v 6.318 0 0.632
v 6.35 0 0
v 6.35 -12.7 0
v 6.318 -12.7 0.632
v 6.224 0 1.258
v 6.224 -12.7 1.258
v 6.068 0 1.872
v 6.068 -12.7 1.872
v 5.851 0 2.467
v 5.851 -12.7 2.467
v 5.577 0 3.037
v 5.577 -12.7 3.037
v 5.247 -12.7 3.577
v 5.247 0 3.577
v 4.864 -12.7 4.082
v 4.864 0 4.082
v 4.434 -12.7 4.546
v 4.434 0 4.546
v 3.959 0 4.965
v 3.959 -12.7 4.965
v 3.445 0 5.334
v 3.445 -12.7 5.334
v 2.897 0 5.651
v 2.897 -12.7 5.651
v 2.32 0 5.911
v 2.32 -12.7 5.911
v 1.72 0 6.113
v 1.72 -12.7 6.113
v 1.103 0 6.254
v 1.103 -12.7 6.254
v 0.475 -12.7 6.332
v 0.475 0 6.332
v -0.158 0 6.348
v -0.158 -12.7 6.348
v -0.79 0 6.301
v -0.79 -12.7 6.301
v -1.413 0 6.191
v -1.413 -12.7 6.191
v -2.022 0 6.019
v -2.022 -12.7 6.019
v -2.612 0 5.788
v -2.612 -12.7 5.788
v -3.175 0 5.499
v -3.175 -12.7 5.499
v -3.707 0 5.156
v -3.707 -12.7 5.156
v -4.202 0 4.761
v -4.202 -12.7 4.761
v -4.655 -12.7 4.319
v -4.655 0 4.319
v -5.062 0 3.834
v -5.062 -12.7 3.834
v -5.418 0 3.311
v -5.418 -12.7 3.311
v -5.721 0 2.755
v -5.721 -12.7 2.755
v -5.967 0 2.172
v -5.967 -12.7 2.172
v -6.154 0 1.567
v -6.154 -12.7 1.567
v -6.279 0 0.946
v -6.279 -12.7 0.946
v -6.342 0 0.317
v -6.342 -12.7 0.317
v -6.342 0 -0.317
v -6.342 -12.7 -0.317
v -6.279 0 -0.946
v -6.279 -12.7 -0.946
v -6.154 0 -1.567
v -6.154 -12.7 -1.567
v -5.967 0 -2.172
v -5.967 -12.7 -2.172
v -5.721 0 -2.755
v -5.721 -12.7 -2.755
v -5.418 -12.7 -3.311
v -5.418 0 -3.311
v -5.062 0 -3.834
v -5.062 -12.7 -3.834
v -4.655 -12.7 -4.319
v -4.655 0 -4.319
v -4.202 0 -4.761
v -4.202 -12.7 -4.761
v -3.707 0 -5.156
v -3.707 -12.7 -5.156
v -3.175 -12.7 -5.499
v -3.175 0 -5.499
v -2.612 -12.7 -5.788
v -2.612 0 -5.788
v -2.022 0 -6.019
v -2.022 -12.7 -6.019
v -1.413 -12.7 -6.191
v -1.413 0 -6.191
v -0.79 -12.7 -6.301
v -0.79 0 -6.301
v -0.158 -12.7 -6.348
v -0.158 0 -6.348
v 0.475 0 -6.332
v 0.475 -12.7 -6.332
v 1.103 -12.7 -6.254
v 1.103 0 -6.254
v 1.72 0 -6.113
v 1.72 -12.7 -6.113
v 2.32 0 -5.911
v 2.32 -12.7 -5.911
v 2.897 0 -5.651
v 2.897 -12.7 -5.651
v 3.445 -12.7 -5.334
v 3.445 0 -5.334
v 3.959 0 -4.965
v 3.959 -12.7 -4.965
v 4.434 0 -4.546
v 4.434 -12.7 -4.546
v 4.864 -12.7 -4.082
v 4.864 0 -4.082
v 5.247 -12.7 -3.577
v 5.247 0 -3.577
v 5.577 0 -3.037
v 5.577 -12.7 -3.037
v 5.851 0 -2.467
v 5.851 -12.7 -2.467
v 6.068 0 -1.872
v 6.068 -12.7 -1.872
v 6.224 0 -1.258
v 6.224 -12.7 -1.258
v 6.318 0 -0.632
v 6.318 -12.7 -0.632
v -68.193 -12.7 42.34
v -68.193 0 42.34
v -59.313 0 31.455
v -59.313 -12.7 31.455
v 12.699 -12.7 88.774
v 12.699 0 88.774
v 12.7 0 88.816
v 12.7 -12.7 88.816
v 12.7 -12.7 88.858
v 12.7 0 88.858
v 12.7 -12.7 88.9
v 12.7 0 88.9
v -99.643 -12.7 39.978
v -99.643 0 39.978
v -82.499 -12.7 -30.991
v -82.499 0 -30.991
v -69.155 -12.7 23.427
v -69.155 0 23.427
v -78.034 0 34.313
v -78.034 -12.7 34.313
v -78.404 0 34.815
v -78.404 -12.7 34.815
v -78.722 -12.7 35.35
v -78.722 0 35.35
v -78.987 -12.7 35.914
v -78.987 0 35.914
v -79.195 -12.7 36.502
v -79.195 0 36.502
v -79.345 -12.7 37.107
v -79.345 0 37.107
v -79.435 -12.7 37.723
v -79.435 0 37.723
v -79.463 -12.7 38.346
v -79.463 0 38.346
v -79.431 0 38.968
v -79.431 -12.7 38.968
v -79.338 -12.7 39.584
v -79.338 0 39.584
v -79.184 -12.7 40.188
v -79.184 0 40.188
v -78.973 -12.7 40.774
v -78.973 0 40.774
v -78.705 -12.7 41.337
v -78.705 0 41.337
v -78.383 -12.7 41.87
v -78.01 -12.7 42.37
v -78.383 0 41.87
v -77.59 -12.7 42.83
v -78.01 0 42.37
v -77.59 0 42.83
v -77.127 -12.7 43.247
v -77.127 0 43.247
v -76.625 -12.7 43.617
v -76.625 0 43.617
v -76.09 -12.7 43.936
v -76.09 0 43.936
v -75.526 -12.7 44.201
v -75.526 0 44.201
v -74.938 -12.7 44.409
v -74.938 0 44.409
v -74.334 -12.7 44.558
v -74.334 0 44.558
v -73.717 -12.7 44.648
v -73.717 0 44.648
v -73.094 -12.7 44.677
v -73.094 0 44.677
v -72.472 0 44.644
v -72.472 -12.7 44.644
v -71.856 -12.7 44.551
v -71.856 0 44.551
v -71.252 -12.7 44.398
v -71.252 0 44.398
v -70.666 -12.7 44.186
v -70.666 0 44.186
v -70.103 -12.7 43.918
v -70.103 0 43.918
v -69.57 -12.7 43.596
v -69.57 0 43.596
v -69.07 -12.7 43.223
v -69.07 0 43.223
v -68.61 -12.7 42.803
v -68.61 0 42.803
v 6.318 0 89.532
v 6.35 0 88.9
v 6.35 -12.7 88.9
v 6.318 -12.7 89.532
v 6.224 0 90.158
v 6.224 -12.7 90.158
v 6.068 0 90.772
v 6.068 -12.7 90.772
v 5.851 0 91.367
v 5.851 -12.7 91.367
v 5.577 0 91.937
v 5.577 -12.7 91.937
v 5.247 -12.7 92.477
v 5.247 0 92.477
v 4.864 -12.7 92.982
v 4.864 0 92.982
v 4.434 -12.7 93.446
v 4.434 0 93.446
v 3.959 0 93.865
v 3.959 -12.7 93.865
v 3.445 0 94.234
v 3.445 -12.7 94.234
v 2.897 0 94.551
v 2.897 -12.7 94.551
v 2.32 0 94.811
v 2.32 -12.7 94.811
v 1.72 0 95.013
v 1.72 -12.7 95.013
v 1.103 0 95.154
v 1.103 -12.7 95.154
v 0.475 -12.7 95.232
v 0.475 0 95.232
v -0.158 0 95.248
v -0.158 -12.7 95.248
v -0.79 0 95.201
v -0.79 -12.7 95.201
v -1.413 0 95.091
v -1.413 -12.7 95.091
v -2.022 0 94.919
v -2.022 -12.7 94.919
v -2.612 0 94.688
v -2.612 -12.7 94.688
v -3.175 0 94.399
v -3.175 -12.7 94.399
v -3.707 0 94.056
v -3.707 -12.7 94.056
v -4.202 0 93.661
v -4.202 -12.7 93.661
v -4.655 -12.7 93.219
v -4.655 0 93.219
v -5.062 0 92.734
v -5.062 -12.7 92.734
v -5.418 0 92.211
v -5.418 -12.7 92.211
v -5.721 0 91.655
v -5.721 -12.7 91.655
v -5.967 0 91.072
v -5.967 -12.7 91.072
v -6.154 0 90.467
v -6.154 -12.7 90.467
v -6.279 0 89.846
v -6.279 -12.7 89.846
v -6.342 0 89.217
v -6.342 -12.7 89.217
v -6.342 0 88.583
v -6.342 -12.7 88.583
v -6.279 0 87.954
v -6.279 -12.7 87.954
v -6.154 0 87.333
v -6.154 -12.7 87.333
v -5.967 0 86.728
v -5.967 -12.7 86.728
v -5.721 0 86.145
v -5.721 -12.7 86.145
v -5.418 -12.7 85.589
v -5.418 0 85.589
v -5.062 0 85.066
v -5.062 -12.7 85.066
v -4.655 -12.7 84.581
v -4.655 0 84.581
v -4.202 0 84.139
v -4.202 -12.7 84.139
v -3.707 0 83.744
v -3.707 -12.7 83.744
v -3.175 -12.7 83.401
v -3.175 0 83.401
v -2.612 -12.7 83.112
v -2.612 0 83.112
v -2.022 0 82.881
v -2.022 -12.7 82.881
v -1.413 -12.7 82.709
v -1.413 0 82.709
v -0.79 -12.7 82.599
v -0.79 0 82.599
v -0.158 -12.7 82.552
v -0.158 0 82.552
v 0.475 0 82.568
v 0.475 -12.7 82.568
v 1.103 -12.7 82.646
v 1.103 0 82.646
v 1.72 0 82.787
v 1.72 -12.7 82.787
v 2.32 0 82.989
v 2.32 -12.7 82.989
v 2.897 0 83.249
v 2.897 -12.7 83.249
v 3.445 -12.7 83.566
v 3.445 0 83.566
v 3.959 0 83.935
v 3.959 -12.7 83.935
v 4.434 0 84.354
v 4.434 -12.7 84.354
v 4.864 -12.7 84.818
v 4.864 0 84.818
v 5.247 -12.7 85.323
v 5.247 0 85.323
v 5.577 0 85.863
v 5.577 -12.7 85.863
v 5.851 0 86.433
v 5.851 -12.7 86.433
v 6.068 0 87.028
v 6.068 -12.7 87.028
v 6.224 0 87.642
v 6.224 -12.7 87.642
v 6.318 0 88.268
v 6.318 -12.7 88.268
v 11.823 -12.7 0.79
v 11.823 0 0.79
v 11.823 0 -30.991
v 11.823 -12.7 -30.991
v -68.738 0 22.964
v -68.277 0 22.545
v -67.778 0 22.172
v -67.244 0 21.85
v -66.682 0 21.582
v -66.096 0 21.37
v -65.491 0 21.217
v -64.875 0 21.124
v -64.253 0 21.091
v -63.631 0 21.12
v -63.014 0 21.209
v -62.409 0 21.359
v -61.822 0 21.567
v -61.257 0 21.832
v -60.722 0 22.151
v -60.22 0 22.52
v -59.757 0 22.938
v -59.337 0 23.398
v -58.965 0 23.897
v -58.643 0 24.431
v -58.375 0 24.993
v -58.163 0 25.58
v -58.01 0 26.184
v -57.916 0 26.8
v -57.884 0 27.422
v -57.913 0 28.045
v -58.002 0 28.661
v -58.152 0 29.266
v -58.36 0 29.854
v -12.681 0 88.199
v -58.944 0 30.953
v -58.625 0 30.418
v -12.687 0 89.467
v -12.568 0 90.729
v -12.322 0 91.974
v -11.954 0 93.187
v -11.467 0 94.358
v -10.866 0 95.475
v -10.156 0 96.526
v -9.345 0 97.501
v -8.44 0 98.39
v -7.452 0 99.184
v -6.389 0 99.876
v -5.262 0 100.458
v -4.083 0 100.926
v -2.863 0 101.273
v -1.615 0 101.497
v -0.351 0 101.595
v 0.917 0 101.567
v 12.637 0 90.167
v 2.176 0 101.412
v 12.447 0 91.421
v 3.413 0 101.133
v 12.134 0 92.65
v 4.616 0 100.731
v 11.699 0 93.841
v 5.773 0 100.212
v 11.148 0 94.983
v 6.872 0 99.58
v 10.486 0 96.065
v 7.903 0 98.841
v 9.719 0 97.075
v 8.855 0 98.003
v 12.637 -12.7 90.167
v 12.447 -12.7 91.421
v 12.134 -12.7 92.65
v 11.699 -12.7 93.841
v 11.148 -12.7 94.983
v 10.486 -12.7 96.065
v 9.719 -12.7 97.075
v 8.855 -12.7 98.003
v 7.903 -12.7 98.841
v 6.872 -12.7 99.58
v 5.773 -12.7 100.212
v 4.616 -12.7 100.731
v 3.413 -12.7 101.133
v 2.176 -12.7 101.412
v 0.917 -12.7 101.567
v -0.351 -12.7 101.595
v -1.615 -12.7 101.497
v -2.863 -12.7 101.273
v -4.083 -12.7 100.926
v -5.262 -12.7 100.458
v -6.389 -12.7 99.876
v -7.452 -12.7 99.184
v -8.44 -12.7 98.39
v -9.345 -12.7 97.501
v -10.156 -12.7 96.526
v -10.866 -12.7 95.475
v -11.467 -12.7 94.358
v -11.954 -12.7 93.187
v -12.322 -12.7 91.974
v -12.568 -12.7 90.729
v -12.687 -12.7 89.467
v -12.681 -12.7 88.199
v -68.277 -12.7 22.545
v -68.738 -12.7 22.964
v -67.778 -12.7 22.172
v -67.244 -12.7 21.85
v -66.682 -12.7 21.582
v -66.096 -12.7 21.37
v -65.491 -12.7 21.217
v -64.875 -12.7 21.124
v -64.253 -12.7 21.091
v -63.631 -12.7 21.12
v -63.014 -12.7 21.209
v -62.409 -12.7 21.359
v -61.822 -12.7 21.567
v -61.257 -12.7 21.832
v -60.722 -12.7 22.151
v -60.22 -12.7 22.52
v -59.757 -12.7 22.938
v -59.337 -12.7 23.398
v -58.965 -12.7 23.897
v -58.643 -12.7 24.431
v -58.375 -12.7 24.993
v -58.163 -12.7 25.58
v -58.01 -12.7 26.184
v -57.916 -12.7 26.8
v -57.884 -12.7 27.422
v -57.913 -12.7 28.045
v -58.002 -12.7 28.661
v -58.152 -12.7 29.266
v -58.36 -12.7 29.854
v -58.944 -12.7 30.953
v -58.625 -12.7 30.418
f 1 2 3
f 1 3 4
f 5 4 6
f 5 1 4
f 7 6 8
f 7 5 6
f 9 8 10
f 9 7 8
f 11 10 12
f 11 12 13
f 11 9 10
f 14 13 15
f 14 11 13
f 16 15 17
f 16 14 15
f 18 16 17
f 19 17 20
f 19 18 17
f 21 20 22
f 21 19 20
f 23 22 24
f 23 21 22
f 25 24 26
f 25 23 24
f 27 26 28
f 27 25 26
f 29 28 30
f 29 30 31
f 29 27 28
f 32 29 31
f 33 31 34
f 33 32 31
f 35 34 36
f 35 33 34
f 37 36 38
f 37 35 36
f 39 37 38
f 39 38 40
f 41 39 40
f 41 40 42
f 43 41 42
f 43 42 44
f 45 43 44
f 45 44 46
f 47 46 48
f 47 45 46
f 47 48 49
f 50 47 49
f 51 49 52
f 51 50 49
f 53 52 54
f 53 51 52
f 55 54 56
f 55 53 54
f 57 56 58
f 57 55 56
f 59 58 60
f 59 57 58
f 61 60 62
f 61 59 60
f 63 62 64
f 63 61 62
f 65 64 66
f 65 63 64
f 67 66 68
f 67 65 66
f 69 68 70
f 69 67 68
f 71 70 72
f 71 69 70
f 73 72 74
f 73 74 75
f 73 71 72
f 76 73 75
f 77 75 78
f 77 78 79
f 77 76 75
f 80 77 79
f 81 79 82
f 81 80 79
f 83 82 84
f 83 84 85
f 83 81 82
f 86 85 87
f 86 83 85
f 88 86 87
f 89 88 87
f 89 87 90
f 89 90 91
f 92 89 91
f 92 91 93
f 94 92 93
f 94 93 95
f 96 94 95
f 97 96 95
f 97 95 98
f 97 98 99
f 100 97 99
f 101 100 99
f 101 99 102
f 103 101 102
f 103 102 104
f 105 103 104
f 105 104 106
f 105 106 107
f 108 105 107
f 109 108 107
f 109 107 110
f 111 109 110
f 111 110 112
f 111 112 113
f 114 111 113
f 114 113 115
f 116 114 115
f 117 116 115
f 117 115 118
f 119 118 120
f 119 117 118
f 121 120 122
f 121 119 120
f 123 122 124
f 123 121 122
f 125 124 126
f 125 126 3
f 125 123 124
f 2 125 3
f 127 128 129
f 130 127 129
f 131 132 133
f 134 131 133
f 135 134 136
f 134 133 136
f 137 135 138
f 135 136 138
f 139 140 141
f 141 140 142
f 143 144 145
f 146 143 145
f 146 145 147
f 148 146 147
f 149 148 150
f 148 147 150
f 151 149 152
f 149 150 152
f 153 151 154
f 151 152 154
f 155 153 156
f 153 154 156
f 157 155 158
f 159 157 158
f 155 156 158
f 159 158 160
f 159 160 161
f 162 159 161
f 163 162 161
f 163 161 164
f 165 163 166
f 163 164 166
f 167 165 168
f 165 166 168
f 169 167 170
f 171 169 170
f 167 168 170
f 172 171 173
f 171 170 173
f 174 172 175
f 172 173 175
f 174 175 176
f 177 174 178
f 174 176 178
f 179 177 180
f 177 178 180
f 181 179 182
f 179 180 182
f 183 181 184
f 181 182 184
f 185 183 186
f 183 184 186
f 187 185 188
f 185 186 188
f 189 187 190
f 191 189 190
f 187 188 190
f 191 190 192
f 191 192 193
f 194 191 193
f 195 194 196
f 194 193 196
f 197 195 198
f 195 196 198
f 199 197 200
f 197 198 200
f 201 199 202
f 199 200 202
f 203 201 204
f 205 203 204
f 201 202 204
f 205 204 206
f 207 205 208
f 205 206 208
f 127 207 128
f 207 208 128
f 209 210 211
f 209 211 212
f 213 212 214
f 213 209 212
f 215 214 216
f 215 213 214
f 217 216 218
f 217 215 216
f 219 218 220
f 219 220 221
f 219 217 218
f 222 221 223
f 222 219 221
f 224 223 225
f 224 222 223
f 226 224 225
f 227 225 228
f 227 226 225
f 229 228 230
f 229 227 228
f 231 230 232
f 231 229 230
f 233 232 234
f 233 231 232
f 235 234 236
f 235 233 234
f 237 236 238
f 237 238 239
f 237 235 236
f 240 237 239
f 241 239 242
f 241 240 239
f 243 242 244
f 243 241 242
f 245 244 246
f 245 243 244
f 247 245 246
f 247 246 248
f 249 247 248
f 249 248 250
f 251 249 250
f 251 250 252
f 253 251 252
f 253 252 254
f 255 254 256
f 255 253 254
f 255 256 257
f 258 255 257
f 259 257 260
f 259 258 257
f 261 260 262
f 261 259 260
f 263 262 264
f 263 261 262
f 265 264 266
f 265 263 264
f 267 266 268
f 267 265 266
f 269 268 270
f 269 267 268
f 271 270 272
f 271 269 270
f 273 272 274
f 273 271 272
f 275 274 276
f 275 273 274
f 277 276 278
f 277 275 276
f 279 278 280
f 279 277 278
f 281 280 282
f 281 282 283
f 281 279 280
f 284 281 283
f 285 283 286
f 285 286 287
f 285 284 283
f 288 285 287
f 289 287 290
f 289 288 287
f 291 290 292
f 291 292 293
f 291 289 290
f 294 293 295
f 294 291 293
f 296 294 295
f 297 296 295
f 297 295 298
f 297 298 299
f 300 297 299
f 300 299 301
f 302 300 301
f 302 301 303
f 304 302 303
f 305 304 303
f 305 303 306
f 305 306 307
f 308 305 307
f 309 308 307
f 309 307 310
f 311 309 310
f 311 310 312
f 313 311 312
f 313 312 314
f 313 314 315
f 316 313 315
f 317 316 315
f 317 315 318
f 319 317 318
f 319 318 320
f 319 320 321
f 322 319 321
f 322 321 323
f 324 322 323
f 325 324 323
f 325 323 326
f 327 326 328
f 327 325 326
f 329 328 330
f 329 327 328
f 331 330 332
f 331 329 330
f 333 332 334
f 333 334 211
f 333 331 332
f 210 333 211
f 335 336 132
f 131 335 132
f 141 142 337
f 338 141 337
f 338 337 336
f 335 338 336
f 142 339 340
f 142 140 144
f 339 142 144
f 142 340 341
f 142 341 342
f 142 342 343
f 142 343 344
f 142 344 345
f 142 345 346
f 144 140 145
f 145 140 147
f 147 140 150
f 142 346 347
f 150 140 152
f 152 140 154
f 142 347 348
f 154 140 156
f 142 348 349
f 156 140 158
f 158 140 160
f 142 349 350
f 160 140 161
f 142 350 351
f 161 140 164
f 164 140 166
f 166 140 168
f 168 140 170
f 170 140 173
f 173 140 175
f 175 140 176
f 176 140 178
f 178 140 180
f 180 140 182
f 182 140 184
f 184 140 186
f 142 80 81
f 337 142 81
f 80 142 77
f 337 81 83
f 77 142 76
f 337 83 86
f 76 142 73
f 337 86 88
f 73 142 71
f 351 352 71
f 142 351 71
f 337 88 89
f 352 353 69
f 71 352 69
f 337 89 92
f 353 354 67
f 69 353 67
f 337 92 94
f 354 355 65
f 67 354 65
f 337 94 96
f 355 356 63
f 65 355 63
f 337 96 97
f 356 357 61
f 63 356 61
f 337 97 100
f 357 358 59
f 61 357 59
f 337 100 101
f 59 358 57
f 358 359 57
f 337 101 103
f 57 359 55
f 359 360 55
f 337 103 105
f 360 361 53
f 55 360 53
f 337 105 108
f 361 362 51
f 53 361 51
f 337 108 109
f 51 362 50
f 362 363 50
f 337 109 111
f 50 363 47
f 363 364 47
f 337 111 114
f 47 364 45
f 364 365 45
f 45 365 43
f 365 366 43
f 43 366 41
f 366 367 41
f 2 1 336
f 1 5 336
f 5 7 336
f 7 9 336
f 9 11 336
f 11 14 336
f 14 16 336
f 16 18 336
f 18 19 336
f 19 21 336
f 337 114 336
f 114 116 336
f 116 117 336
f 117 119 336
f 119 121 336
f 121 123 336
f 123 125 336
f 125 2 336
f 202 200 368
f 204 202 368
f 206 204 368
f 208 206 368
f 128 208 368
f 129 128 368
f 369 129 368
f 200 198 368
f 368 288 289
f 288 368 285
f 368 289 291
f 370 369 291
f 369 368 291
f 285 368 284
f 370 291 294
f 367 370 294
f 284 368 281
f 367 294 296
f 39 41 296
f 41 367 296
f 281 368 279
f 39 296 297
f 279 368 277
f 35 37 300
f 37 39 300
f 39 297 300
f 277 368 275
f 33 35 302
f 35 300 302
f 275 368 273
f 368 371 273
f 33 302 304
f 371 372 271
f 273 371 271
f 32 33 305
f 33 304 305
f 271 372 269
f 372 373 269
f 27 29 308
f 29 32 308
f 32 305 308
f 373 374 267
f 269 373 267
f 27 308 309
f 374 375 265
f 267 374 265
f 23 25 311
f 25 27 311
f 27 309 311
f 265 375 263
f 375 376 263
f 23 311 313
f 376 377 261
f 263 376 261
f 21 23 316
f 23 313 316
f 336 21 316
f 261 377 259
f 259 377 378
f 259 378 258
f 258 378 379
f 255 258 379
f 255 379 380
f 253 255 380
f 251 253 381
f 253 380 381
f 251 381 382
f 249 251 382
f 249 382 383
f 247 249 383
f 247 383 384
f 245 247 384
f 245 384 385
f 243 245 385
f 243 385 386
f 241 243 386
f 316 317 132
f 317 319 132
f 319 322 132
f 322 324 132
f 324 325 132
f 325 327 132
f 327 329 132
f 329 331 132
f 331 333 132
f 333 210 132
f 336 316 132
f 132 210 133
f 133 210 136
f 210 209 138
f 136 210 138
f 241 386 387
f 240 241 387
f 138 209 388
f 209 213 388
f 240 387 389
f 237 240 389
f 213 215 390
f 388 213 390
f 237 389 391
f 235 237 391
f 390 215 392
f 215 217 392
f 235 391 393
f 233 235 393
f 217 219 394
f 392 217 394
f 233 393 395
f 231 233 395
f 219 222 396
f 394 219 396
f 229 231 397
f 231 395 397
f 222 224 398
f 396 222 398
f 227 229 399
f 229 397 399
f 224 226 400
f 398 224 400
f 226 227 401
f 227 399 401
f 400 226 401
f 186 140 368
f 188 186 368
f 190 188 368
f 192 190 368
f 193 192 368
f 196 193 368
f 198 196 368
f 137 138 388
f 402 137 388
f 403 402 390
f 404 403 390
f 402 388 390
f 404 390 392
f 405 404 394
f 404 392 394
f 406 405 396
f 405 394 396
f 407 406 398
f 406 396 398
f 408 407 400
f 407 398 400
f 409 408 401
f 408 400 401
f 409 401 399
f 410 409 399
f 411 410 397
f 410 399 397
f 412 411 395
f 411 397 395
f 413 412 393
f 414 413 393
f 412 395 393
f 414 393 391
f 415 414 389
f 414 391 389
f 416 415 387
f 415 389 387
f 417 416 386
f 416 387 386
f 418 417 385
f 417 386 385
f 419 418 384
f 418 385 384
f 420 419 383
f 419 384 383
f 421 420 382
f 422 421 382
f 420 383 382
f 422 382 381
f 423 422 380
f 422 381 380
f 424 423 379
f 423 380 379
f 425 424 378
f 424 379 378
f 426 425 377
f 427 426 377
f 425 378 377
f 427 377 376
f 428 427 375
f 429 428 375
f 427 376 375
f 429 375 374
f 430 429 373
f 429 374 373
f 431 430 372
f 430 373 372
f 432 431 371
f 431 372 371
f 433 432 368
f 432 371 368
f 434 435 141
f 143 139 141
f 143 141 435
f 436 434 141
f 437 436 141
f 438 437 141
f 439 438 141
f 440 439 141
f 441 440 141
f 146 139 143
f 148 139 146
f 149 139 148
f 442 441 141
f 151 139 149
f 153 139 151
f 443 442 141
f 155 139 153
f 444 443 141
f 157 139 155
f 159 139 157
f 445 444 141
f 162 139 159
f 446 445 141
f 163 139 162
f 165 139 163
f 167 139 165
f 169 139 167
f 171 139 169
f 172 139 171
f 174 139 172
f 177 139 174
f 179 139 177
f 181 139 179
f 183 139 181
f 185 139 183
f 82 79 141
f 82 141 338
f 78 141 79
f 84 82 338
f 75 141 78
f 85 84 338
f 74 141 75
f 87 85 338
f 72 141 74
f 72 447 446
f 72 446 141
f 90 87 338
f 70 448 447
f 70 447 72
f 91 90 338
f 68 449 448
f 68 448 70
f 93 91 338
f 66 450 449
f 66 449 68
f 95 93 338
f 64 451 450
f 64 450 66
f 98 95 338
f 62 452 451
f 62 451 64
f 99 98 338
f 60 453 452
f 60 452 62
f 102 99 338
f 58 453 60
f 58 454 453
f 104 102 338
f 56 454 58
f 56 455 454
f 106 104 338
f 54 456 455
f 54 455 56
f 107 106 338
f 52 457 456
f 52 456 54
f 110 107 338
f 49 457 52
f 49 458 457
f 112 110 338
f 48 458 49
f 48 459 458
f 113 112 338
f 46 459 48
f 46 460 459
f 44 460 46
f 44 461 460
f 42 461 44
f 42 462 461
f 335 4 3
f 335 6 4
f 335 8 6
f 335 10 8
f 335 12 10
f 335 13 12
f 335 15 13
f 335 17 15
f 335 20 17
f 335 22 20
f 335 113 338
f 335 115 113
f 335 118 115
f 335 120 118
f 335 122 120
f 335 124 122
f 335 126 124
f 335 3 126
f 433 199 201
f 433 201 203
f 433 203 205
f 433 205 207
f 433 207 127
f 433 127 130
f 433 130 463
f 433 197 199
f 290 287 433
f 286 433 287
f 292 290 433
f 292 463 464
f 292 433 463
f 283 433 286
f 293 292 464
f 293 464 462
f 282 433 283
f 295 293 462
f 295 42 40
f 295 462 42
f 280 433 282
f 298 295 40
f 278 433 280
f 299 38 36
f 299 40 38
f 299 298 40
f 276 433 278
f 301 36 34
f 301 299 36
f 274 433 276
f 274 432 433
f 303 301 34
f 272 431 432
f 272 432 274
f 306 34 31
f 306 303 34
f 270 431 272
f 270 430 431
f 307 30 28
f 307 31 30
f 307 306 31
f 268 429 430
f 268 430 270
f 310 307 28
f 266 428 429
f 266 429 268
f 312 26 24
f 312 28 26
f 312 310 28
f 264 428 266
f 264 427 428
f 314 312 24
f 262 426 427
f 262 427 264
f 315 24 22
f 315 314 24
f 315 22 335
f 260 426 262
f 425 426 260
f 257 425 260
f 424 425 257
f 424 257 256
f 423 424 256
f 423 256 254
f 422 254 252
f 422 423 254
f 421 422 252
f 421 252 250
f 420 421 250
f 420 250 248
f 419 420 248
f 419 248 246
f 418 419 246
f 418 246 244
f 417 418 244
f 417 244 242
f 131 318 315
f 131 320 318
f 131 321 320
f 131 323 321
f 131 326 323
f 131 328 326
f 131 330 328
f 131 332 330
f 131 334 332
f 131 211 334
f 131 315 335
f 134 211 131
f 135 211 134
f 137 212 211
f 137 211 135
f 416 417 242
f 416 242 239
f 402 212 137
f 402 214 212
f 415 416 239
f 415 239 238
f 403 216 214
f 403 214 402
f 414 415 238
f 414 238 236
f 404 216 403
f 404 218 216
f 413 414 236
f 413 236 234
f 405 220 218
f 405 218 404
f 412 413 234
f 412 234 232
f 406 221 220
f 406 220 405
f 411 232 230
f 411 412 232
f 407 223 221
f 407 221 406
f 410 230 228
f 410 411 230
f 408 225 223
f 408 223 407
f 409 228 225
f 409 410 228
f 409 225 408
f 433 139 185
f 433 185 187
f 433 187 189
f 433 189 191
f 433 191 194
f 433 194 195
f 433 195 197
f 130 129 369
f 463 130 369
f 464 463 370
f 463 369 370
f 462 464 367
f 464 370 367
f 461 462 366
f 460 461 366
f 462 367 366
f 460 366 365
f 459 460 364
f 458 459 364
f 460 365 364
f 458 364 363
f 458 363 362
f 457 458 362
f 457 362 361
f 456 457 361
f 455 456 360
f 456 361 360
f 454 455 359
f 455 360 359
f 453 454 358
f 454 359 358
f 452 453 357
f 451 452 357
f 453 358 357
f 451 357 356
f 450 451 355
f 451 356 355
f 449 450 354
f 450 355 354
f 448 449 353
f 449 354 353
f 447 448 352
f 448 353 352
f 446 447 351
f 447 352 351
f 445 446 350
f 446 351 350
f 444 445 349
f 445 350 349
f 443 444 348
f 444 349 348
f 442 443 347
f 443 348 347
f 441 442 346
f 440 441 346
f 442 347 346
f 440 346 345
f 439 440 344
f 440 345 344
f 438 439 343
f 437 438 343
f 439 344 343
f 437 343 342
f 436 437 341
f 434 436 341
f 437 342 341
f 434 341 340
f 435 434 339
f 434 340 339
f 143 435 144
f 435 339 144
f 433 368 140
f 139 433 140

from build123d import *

# Parameters (mm, degrees)
F0_R     = 6.35
F1_DEPTH = 12.7


with BuildPart() as f1:
    # F0 (on Front) → F1 (new body)
    with BuildSketch(Plane.XZ):
        with BuildLine():
            Line((11.823206, 0.789718), (12.69937, 88.773537))
            ThreePointArc((12.69937, 88.773537), (0.287554, 76.203256), (-12.680624, 88.198734))
            Line((-12.680624, 88.198734), (-99.642679, 39.977666))
            Line((-99.642679, 39.977666), (-82.499451, -30.991102))
            Line((-82.499451, -30.991102), (11.823206, -30.991102))
            Line((11.823206, -30.991102), (11.823206, 0.789718))
        make_face()
        with BuildLine():
            Line((-69.154671, 23.427376), (-78.033982, 34.313091))
            ThreePointArc((-78.033982, 34.313091), (-77.127032, 43.247431), (-68.192691, 42.340481))
            Line((-68.192691, 42.340481), (-59.313381, 31.454767))
            ThreePointArc((-59.313381, 31.454767), (-60.220331, 22.520426), (-69.154671, 23.427376))
        make_face(mode=Mode.SUBTRACT)
        Circle(F0_R, mode=Mode.SUBTRACT)
        with BuildLine():
            ThreePointArc((-12.680624, 88.198734), (0.287554, 76.203256), (12.69937, 88.773537))
            ThreePointArc((12.69937, 88.773537), (12.699843, 88.836768), (12.7, 88.9))
            ThreePointArc((12.7, 88.9), (-0.350767, 101.595155), (-12.680624, 88.198734))
        make_face()
        with Locations((0, 88.9)):
            Circle(F0_R, mode=Mode.SUBTRACT)
    extrude(amount=F1_DEPTH)


solid = f1.part
